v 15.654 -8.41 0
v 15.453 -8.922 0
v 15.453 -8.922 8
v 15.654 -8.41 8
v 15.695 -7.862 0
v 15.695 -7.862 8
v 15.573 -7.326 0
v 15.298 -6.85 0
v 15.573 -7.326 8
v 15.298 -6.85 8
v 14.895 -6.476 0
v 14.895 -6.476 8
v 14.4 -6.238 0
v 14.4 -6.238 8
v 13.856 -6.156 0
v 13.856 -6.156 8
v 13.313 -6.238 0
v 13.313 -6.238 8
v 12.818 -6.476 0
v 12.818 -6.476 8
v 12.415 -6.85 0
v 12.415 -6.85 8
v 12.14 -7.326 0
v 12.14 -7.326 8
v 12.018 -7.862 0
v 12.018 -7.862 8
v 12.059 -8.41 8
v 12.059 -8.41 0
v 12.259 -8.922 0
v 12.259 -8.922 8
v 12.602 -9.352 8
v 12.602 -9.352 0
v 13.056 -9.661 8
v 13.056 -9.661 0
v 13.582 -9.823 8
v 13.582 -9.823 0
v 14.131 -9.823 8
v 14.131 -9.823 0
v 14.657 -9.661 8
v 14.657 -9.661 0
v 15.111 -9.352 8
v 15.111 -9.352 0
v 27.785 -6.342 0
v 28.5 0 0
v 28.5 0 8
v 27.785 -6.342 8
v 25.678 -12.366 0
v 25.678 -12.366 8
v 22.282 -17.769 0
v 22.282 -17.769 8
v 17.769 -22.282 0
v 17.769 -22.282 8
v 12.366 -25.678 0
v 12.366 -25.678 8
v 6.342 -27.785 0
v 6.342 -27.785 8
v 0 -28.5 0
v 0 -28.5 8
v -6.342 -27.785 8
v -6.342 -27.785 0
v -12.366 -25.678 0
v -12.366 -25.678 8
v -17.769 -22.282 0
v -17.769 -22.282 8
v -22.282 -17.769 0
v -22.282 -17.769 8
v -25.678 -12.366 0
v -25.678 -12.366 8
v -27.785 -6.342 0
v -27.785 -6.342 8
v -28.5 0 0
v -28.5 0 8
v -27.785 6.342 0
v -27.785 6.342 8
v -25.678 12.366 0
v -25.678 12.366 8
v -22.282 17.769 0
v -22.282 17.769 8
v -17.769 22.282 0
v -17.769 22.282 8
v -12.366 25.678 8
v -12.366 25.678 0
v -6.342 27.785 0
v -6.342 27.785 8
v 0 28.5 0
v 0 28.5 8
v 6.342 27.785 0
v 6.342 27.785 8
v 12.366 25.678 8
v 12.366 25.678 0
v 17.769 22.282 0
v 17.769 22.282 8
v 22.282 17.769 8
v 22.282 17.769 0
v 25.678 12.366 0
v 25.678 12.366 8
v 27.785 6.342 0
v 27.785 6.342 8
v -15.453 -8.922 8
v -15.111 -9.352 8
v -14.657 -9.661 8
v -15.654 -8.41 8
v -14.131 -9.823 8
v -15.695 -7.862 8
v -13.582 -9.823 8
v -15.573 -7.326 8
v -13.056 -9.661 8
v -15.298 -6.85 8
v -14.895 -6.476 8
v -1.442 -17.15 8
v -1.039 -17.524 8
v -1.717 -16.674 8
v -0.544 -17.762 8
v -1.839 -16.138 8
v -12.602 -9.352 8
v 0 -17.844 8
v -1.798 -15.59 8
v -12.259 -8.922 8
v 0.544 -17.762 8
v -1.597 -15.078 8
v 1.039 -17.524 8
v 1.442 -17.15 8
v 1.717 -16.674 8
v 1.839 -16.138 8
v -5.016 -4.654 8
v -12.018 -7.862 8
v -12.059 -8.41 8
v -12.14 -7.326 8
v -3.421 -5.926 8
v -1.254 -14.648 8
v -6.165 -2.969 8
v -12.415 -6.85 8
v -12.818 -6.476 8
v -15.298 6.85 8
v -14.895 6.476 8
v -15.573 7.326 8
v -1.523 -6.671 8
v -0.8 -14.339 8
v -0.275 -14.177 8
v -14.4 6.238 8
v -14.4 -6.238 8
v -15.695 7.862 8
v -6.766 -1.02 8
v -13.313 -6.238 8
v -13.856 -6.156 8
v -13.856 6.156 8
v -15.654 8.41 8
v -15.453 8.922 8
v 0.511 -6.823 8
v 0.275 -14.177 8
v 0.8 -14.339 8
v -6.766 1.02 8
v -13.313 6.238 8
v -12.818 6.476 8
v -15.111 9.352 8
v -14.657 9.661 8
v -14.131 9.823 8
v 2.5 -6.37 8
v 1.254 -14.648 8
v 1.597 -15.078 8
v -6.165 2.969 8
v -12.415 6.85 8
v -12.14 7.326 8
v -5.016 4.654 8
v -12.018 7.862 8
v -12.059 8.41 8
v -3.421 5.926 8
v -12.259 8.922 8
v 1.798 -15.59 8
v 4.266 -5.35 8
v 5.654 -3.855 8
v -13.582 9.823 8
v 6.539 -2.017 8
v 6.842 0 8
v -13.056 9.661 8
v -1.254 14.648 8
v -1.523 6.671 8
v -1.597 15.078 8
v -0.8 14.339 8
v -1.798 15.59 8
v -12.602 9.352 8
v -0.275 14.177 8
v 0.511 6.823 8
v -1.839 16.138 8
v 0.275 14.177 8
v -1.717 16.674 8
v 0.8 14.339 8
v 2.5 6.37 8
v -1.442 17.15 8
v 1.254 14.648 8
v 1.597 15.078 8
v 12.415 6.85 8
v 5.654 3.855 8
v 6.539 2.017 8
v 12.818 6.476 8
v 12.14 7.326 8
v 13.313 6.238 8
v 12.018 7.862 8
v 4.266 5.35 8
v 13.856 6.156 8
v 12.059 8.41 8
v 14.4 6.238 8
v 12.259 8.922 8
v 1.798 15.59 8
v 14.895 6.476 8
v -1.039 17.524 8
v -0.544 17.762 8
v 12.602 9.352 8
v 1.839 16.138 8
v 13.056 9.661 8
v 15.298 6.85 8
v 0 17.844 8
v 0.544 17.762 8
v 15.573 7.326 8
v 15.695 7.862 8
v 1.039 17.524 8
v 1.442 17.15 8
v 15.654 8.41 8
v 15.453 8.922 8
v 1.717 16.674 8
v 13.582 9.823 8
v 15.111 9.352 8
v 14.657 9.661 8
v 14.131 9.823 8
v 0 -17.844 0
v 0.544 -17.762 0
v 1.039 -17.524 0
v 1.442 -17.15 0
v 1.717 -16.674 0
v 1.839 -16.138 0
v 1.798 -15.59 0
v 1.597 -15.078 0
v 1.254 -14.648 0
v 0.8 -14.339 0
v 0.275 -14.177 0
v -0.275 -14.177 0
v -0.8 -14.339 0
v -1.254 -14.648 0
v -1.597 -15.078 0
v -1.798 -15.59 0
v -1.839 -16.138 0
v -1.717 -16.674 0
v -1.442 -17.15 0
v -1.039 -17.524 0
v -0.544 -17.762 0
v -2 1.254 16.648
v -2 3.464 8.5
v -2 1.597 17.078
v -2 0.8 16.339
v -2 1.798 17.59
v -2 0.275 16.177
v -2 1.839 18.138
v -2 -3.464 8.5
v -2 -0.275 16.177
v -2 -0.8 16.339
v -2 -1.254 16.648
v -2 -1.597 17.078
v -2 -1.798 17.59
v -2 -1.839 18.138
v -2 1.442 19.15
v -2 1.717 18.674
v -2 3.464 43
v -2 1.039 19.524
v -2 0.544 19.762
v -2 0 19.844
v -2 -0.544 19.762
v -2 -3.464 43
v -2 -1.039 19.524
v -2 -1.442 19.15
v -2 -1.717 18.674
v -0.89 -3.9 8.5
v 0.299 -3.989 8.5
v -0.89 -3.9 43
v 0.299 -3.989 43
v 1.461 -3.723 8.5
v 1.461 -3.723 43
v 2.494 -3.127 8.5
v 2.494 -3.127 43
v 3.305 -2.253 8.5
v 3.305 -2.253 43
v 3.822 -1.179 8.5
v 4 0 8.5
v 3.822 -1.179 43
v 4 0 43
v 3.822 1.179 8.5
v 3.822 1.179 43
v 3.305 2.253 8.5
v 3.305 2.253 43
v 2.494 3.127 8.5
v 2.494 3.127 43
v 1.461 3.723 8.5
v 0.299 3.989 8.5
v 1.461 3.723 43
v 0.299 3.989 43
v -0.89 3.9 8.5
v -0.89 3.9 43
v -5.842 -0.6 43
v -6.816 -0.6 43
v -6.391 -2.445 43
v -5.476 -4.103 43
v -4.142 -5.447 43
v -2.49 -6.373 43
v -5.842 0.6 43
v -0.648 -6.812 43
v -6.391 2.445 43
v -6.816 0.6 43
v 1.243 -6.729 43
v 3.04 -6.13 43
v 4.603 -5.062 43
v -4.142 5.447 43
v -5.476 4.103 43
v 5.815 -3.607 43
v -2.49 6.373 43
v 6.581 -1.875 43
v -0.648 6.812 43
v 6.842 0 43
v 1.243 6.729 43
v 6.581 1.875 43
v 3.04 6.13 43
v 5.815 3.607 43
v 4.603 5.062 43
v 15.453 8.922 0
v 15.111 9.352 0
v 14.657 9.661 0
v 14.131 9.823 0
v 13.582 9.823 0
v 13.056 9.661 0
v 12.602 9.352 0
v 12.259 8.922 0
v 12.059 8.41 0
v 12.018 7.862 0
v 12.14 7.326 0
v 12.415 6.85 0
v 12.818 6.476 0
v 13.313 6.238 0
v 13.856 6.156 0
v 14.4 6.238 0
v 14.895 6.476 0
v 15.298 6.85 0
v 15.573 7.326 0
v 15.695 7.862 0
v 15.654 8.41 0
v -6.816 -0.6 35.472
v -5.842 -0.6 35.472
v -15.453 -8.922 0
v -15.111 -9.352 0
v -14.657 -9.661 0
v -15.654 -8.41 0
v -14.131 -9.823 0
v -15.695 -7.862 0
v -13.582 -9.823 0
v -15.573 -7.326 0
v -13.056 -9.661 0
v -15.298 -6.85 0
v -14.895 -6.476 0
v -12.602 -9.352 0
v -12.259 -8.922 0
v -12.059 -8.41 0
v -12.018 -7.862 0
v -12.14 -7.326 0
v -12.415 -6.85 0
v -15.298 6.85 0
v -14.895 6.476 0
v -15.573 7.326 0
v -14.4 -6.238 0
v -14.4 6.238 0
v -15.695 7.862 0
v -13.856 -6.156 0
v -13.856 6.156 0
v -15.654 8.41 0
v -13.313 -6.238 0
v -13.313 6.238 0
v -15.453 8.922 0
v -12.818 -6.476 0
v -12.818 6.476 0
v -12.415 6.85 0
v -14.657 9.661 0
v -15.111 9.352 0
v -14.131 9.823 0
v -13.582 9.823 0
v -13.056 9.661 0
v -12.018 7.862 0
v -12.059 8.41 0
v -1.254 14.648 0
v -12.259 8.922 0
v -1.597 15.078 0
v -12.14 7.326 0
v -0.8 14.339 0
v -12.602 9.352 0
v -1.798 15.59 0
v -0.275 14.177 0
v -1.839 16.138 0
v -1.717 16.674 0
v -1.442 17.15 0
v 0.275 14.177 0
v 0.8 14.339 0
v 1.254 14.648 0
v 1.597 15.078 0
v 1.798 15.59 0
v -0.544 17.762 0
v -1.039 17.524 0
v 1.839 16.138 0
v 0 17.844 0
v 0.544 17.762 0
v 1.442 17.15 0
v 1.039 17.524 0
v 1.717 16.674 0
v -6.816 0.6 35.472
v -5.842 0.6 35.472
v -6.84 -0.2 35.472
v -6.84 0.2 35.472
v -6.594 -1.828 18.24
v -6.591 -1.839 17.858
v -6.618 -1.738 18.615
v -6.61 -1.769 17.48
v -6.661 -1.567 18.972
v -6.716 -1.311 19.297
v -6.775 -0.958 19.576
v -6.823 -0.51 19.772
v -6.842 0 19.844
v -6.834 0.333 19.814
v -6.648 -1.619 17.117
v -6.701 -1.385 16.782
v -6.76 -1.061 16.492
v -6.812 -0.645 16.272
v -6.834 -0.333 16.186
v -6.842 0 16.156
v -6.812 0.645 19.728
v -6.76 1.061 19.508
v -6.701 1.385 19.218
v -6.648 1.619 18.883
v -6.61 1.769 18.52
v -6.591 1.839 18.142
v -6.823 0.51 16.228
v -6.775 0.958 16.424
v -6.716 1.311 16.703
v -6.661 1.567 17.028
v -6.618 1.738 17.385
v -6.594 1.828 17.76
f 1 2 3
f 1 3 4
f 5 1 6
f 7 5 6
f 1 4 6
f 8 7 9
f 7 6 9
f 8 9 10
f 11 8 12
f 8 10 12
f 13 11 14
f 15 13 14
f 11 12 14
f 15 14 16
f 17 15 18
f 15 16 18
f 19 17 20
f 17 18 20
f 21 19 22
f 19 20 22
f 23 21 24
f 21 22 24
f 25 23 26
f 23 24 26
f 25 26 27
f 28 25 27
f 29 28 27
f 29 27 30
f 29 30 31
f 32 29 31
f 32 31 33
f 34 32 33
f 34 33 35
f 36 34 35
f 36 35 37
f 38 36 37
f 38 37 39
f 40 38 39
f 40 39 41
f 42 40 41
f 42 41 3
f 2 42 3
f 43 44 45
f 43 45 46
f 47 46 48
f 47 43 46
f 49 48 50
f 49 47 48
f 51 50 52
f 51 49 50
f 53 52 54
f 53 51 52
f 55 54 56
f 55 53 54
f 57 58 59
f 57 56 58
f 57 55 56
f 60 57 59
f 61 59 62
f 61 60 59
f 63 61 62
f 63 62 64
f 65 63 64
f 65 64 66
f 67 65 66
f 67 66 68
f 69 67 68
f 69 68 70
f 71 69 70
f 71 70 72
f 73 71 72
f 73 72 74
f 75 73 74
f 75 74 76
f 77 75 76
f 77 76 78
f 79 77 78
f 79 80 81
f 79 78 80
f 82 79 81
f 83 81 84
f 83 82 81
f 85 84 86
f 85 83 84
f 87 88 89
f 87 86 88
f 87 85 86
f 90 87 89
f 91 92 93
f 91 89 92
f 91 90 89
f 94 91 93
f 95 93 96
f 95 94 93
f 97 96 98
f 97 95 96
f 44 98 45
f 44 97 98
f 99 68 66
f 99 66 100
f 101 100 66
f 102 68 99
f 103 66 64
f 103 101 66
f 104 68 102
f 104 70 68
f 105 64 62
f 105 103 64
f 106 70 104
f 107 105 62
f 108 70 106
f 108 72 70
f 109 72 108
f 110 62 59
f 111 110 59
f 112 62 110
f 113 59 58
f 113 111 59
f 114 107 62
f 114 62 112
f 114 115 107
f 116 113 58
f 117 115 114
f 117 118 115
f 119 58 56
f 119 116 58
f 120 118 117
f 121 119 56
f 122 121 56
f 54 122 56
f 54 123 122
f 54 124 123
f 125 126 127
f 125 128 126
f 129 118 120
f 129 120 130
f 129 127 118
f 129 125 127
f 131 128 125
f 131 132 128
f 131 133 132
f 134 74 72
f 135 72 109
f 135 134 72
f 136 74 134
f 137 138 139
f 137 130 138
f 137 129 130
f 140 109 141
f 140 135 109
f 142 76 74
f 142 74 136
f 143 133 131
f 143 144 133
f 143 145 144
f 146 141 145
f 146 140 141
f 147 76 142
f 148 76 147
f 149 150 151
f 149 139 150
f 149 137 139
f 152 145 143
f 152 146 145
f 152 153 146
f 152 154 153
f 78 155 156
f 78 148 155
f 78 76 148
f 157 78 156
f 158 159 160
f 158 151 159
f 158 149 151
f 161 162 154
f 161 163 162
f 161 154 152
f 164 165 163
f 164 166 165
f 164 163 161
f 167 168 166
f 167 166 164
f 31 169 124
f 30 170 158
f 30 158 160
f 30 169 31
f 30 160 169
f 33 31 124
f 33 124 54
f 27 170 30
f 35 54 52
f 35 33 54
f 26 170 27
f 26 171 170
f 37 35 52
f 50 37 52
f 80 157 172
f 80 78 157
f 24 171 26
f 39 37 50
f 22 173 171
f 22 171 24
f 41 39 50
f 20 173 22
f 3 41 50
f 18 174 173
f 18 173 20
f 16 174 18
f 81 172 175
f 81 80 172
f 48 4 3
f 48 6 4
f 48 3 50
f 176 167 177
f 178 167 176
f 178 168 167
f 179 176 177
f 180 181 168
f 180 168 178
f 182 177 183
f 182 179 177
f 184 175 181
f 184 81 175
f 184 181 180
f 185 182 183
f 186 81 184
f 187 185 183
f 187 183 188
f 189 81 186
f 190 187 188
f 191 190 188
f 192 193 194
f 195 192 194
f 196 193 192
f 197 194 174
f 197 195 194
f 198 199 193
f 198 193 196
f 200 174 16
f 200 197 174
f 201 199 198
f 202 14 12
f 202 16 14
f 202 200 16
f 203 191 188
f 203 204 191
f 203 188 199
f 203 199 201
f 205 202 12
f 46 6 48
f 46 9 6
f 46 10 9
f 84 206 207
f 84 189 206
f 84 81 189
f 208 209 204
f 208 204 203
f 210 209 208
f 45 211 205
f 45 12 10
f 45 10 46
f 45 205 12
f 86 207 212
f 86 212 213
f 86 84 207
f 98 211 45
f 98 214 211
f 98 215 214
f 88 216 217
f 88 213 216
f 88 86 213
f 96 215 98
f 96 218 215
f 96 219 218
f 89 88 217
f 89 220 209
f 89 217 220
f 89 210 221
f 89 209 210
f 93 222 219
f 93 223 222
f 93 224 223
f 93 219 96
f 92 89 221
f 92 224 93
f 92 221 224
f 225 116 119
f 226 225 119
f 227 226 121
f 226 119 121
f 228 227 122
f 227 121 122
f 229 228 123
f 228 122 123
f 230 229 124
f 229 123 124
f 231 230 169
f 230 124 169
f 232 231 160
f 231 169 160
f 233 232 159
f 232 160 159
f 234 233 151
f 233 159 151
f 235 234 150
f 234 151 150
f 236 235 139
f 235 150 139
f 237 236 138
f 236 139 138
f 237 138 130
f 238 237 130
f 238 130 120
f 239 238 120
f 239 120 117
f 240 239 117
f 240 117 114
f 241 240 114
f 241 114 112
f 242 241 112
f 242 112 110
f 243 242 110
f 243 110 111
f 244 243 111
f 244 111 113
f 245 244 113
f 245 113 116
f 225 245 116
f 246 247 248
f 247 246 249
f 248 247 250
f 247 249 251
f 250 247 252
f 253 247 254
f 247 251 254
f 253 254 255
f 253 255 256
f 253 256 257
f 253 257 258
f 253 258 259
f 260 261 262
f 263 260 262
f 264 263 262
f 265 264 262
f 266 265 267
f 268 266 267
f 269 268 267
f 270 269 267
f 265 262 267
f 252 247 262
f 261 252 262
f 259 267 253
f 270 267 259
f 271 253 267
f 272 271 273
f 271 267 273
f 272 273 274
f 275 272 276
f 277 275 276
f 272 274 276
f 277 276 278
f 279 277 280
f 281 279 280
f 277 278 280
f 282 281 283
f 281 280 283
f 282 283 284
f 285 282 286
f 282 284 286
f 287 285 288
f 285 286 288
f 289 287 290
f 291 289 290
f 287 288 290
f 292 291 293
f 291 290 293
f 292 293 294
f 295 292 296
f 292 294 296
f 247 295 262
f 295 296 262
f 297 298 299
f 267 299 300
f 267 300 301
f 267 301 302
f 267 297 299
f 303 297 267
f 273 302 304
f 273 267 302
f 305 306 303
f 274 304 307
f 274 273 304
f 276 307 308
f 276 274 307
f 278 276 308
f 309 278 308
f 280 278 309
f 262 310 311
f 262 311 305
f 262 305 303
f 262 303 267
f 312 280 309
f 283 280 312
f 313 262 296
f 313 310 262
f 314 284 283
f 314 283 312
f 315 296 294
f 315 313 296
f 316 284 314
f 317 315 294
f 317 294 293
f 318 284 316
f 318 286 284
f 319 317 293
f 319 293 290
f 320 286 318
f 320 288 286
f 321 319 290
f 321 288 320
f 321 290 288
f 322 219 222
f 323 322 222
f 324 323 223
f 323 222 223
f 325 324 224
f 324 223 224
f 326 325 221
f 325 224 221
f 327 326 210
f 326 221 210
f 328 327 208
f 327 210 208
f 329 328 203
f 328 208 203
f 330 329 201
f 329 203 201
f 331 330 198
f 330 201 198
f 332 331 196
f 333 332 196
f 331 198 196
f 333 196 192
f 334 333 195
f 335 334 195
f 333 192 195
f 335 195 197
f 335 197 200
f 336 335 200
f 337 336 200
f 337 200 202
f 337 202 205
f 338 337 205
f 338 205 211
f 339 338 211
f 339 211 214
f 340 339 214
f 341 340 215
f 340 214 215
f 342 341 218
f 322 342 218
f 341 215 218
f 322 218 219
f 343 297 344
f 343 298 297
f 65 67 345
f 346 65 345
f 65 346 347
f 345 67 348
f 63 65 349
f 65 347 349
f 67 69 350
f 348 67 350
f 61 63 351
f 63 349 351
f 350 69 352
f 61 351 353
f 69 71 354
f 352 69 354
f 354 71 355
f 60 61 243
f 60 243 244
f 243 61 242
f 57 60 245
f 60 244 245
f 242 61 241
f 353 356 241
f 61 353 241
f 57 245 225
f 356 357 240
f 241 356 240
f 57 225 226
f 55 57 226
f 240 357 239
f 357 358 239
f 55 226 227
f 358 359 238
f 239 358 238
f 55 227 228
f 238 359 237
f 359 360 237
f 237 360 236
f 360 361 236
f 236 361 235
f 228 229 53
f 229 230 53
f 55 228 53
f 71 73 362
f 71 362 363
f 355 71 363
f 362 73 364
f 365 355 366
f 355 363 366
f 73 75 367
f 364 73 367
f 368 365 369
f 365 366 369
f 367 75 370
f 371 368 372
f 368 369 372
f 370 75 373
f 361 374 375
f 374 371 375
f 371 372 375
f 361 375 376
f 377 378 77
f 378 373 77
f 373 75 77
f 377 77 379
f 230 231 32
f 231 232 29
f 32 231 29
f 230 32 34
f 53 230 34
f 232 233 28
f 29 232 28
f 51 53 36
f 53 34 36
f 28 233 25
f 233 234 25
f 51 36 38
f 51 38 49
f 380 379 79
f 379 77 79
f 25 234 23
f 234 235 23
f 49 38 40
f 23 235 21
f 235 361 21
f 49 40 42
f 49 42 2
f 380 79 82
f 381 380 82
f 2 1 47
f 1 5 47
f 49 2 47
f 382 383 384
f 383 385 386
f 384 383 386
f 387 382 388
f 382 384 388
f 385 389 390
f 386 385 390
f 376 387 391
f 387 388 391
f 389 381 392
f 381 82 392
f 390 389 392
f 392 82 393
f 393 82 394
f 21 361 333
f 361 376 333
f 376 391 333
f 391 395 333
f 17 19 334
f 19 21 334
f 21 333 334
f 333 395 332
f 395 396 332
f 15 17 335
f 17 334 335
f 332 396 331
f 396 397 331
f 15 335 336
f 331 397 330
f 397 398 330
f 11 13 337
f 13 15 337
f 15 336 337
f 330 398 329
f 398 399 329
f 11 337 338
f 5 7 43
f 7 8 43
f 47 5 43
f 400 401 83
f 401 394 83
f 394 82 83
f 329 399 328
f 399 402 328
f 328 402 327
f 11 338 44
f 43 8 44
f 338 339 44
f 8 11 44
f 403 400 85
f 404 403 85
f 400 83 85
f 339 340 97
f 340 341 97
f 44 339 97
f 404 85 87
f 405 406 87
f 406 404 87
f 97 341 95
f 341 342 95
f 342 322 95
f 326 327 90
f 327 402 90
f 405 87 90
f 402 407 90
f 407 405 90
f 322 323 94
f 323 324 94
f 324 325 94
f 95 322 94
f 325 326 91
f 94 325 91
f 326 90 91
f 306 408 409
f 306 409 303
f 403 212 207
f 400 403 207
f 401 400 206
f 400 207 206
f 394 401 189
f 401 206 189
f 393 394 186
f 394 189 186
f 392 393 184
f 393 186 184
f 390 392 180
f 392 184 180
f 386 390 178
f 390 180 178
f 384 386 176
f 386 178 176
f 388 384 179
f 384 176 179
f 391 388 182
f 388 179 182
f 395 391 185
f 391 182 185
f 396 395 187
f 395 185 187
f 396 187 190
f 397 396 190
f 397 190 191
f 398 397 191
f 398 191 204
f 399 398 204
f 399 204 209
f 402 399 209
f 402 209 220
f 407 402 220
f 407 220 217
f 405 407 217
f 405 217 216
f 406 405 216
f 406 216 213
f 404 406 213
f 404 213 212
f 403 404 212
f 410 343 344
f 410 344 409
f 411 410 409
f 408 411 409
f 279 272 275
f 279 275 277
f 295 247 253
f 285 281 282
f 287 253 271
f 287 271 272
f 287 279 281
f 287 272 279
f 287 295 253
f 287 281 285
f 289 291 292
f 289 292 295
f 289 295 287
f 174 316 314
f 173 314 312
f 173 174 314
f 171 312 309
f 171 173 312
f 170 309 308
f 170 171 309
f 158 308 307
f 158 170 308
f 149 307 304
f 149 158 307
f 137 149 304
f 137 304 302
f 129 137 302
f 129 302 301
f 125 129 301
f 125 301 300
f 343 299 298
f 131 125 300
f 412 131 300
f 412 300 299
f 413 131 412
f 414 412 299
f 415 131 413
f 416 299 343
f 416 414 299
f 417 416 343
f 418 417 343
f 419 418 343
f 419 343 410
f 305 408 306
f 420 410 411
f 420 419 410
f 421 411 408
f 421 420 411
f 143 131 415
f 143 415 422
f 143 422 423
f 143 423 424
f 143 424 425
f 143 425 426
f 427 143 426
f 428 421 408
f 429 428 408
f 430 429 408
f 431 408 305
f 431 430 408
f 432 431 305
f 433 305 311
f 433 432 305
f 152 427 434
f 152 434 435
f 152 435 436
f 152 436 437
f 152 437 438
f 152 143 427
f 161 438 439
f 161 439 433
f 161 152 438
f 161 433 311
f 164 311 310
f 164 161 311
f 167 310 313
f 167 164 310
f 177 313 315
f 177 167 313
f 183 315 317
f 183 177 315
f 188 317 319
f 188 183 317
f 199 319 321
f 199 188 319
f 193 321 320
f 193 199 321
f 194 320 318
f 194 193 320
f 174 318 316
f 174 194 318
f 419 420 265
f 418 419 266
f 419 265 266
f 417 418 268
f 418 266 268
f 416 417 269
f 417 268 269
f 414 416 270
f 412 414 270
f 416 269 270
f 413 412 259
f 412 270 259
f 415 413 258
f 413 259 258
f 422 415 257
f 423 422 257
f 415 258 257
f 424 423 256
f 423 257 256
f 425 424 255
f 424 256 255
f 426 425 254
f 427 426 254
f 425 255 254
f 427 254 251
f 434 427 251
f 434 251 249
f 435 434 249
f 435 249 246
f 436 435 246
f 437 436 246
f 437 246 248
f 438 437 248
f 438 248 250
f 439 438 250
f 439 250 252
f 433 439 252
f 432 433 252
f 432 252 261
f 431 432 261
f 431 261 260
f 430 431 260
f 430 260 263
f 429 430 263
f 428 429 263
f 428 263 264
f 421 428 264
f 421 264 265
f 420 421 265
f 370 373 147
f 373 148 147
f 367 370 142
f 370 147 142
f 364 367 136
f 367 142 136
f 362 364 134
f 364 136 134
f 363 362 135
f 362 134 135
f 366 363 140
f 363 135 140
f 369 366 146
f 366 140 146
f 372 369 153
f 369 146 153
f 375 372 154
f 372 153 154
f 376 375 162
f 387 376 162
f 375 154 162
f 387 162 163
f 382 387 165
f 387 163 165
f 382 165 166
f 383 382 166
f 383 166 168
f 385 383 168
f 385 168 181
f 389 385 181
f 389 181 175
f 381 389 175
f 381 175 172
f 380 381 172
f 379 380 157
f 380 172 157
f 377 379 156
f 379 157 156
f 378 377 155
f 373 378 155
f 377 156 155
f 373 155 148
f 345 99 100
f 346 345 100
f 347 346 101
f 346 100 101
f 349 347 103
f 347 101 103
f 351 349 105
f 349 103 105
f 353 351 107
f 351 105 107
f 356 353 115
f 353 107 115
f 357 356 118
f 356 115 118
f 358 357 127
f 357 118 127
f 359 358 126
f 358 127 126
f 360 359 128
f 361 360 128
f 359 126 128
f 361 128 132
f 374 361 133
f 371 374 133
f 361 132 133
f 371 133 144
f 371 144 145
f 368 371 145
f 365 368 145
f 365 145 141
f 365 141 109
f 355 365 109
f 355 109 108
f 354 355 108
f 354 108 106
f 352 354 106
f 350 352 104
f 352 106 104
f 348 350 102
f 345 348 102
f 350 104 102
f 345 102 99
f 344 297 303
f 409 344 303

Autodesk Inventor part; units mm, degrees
sketch "Boceto1" plane through (0, 0, 0) normal (0, 0, 1) x (1, 0, 0)
  circle A0 centre (0, 0) radius 28.5
  dimension "DiametroJunta" = 57
extrude "Extrusión1" add sketch "Boceto1" along normal blind 8
sketch "Boceto2" plane through (0, 0, 8) normal (0, 0, 1) x (1, 0, 0)
  circle A0 centre (0, 0) radius 6.8425
  dimension "DiametroEje" = 13.685
extrude "Extrusión2" add sketch "Boceto2" along normal blind 35
sketch "Boceto3" plane through (0, 0, 43) normal (0, 0, 1) x (1, 0, 0)
  arc A0 (-2, -3.4641) -> (-2, 3.4641) centre (0, 0) ccw
  line L0 (-2, 3.4641) -> (-2, -3.4641)
  circle A1 centre (0, 0) radius 6.8425 projected
  point P0 (2, -3.4641)
  point P1 (2, 3.4641)
  dimension "DiametroEntrada" = 8
  dimension "d21" = 2
extrude "Extrusión3" cut sketch "Boceto3" against normal blind 34.5 contours L0 A0
ref_plane "Plano de trabajo1" through (6.8425, 0, 8) normal (1, 0, 0) x (0, 1, 0)
ref_plane "Plano de trabajo2" through (-6.8425, 0, 8) normal (1, 0, 0) x (0, 1, 0)
sketch "Boceto5" plane through (-6.8425, 0, 8) normal (1, 0, 0) x (0, 1, 0)
  line L0 (6.8425, 35) -> (-6.8425, 35) projected
  line L1 (0, 35) -> (0, 10)
  circle A0 centre (0, 10) radius 1.4978
  line L2 (-0.6, 27.4718) -> (0.6, 27.4718)
  line L3 (0.6, 27.4718) -> (0.6, 35)
  line L4 (0.6, 35) -> (-0.6, 35)
  line L5 (-0.6, 35) -> (-0.6, 27.4718)
  line L6 (-0.6, 27.4718) -> (0.6, 35) construction
  line L7 (0.6, 27.4718) -> (-0.6, 35) construction
  point P0 (0, -8)
  point P1 (0, 31.2359)
  dimension "d54" = 25
  dimension "d91" = 1.2
hole "Agujero2" at (-6.8425, 0, 18) direction (1, 0, 0) diameter 3.6881 depth 6 tip angle 118 thread size "M4.5x0.75" class "6H" standard "ISO Metric profile"
sketch "Boceto7" plane through (0, 0, 0) normal (0, 0, -1) x (-1, 0, 0)
  arc A0 (2, 3.4641) -> (2, -3.4641) centre (0, 0) ccw projected
  circle A1 centre (0, 16) radius 5
  dimension "d35" = 10
  dimension "d49" = 16
ref_plane "Plano de trabajo3" through (0, 22.5, 15) normal (0, 0, -1) x (-1, 0, 0)
ref_plane "Plano de trabajo4" through (0, 11, 8) normal (0, 0, -1) x (-1, 0, 0)
sketch "Boceto9" plane through (0, 11, 8) normal (0, 0, -1) x (-1, 0, 0)
  circle A0 centre (0, 0) radius 2.5
  point P0 (0, -11)
  dimension "d70" = 5
hole "Agujero6" at (0, 16, 0) direction (0, 0, 1) diameter 3.6881 depth 13 thread size "M4.5x0.75" class "6H" standard "ISO Metric profile"
pattern_circular "Patrón circular6" count 6 over 360 about axis through (0, 0, 8) along (0, 0, 1) of "Agujero6"
extrude "Extrusión6" add sketch "Boceto5" along normal blind 1 contours L3 L2 L1 L0 | L1 L2 L5 L0
extrude "Extrusión7" cut sketch "Boceto5" along normal blind 1 contours L3 L2 L1 L0 | L1 L2 L5 L0
equation "\"d21\" = 0.25 * DiametroEntrada"
properties part number "E_01" material "PETG"
